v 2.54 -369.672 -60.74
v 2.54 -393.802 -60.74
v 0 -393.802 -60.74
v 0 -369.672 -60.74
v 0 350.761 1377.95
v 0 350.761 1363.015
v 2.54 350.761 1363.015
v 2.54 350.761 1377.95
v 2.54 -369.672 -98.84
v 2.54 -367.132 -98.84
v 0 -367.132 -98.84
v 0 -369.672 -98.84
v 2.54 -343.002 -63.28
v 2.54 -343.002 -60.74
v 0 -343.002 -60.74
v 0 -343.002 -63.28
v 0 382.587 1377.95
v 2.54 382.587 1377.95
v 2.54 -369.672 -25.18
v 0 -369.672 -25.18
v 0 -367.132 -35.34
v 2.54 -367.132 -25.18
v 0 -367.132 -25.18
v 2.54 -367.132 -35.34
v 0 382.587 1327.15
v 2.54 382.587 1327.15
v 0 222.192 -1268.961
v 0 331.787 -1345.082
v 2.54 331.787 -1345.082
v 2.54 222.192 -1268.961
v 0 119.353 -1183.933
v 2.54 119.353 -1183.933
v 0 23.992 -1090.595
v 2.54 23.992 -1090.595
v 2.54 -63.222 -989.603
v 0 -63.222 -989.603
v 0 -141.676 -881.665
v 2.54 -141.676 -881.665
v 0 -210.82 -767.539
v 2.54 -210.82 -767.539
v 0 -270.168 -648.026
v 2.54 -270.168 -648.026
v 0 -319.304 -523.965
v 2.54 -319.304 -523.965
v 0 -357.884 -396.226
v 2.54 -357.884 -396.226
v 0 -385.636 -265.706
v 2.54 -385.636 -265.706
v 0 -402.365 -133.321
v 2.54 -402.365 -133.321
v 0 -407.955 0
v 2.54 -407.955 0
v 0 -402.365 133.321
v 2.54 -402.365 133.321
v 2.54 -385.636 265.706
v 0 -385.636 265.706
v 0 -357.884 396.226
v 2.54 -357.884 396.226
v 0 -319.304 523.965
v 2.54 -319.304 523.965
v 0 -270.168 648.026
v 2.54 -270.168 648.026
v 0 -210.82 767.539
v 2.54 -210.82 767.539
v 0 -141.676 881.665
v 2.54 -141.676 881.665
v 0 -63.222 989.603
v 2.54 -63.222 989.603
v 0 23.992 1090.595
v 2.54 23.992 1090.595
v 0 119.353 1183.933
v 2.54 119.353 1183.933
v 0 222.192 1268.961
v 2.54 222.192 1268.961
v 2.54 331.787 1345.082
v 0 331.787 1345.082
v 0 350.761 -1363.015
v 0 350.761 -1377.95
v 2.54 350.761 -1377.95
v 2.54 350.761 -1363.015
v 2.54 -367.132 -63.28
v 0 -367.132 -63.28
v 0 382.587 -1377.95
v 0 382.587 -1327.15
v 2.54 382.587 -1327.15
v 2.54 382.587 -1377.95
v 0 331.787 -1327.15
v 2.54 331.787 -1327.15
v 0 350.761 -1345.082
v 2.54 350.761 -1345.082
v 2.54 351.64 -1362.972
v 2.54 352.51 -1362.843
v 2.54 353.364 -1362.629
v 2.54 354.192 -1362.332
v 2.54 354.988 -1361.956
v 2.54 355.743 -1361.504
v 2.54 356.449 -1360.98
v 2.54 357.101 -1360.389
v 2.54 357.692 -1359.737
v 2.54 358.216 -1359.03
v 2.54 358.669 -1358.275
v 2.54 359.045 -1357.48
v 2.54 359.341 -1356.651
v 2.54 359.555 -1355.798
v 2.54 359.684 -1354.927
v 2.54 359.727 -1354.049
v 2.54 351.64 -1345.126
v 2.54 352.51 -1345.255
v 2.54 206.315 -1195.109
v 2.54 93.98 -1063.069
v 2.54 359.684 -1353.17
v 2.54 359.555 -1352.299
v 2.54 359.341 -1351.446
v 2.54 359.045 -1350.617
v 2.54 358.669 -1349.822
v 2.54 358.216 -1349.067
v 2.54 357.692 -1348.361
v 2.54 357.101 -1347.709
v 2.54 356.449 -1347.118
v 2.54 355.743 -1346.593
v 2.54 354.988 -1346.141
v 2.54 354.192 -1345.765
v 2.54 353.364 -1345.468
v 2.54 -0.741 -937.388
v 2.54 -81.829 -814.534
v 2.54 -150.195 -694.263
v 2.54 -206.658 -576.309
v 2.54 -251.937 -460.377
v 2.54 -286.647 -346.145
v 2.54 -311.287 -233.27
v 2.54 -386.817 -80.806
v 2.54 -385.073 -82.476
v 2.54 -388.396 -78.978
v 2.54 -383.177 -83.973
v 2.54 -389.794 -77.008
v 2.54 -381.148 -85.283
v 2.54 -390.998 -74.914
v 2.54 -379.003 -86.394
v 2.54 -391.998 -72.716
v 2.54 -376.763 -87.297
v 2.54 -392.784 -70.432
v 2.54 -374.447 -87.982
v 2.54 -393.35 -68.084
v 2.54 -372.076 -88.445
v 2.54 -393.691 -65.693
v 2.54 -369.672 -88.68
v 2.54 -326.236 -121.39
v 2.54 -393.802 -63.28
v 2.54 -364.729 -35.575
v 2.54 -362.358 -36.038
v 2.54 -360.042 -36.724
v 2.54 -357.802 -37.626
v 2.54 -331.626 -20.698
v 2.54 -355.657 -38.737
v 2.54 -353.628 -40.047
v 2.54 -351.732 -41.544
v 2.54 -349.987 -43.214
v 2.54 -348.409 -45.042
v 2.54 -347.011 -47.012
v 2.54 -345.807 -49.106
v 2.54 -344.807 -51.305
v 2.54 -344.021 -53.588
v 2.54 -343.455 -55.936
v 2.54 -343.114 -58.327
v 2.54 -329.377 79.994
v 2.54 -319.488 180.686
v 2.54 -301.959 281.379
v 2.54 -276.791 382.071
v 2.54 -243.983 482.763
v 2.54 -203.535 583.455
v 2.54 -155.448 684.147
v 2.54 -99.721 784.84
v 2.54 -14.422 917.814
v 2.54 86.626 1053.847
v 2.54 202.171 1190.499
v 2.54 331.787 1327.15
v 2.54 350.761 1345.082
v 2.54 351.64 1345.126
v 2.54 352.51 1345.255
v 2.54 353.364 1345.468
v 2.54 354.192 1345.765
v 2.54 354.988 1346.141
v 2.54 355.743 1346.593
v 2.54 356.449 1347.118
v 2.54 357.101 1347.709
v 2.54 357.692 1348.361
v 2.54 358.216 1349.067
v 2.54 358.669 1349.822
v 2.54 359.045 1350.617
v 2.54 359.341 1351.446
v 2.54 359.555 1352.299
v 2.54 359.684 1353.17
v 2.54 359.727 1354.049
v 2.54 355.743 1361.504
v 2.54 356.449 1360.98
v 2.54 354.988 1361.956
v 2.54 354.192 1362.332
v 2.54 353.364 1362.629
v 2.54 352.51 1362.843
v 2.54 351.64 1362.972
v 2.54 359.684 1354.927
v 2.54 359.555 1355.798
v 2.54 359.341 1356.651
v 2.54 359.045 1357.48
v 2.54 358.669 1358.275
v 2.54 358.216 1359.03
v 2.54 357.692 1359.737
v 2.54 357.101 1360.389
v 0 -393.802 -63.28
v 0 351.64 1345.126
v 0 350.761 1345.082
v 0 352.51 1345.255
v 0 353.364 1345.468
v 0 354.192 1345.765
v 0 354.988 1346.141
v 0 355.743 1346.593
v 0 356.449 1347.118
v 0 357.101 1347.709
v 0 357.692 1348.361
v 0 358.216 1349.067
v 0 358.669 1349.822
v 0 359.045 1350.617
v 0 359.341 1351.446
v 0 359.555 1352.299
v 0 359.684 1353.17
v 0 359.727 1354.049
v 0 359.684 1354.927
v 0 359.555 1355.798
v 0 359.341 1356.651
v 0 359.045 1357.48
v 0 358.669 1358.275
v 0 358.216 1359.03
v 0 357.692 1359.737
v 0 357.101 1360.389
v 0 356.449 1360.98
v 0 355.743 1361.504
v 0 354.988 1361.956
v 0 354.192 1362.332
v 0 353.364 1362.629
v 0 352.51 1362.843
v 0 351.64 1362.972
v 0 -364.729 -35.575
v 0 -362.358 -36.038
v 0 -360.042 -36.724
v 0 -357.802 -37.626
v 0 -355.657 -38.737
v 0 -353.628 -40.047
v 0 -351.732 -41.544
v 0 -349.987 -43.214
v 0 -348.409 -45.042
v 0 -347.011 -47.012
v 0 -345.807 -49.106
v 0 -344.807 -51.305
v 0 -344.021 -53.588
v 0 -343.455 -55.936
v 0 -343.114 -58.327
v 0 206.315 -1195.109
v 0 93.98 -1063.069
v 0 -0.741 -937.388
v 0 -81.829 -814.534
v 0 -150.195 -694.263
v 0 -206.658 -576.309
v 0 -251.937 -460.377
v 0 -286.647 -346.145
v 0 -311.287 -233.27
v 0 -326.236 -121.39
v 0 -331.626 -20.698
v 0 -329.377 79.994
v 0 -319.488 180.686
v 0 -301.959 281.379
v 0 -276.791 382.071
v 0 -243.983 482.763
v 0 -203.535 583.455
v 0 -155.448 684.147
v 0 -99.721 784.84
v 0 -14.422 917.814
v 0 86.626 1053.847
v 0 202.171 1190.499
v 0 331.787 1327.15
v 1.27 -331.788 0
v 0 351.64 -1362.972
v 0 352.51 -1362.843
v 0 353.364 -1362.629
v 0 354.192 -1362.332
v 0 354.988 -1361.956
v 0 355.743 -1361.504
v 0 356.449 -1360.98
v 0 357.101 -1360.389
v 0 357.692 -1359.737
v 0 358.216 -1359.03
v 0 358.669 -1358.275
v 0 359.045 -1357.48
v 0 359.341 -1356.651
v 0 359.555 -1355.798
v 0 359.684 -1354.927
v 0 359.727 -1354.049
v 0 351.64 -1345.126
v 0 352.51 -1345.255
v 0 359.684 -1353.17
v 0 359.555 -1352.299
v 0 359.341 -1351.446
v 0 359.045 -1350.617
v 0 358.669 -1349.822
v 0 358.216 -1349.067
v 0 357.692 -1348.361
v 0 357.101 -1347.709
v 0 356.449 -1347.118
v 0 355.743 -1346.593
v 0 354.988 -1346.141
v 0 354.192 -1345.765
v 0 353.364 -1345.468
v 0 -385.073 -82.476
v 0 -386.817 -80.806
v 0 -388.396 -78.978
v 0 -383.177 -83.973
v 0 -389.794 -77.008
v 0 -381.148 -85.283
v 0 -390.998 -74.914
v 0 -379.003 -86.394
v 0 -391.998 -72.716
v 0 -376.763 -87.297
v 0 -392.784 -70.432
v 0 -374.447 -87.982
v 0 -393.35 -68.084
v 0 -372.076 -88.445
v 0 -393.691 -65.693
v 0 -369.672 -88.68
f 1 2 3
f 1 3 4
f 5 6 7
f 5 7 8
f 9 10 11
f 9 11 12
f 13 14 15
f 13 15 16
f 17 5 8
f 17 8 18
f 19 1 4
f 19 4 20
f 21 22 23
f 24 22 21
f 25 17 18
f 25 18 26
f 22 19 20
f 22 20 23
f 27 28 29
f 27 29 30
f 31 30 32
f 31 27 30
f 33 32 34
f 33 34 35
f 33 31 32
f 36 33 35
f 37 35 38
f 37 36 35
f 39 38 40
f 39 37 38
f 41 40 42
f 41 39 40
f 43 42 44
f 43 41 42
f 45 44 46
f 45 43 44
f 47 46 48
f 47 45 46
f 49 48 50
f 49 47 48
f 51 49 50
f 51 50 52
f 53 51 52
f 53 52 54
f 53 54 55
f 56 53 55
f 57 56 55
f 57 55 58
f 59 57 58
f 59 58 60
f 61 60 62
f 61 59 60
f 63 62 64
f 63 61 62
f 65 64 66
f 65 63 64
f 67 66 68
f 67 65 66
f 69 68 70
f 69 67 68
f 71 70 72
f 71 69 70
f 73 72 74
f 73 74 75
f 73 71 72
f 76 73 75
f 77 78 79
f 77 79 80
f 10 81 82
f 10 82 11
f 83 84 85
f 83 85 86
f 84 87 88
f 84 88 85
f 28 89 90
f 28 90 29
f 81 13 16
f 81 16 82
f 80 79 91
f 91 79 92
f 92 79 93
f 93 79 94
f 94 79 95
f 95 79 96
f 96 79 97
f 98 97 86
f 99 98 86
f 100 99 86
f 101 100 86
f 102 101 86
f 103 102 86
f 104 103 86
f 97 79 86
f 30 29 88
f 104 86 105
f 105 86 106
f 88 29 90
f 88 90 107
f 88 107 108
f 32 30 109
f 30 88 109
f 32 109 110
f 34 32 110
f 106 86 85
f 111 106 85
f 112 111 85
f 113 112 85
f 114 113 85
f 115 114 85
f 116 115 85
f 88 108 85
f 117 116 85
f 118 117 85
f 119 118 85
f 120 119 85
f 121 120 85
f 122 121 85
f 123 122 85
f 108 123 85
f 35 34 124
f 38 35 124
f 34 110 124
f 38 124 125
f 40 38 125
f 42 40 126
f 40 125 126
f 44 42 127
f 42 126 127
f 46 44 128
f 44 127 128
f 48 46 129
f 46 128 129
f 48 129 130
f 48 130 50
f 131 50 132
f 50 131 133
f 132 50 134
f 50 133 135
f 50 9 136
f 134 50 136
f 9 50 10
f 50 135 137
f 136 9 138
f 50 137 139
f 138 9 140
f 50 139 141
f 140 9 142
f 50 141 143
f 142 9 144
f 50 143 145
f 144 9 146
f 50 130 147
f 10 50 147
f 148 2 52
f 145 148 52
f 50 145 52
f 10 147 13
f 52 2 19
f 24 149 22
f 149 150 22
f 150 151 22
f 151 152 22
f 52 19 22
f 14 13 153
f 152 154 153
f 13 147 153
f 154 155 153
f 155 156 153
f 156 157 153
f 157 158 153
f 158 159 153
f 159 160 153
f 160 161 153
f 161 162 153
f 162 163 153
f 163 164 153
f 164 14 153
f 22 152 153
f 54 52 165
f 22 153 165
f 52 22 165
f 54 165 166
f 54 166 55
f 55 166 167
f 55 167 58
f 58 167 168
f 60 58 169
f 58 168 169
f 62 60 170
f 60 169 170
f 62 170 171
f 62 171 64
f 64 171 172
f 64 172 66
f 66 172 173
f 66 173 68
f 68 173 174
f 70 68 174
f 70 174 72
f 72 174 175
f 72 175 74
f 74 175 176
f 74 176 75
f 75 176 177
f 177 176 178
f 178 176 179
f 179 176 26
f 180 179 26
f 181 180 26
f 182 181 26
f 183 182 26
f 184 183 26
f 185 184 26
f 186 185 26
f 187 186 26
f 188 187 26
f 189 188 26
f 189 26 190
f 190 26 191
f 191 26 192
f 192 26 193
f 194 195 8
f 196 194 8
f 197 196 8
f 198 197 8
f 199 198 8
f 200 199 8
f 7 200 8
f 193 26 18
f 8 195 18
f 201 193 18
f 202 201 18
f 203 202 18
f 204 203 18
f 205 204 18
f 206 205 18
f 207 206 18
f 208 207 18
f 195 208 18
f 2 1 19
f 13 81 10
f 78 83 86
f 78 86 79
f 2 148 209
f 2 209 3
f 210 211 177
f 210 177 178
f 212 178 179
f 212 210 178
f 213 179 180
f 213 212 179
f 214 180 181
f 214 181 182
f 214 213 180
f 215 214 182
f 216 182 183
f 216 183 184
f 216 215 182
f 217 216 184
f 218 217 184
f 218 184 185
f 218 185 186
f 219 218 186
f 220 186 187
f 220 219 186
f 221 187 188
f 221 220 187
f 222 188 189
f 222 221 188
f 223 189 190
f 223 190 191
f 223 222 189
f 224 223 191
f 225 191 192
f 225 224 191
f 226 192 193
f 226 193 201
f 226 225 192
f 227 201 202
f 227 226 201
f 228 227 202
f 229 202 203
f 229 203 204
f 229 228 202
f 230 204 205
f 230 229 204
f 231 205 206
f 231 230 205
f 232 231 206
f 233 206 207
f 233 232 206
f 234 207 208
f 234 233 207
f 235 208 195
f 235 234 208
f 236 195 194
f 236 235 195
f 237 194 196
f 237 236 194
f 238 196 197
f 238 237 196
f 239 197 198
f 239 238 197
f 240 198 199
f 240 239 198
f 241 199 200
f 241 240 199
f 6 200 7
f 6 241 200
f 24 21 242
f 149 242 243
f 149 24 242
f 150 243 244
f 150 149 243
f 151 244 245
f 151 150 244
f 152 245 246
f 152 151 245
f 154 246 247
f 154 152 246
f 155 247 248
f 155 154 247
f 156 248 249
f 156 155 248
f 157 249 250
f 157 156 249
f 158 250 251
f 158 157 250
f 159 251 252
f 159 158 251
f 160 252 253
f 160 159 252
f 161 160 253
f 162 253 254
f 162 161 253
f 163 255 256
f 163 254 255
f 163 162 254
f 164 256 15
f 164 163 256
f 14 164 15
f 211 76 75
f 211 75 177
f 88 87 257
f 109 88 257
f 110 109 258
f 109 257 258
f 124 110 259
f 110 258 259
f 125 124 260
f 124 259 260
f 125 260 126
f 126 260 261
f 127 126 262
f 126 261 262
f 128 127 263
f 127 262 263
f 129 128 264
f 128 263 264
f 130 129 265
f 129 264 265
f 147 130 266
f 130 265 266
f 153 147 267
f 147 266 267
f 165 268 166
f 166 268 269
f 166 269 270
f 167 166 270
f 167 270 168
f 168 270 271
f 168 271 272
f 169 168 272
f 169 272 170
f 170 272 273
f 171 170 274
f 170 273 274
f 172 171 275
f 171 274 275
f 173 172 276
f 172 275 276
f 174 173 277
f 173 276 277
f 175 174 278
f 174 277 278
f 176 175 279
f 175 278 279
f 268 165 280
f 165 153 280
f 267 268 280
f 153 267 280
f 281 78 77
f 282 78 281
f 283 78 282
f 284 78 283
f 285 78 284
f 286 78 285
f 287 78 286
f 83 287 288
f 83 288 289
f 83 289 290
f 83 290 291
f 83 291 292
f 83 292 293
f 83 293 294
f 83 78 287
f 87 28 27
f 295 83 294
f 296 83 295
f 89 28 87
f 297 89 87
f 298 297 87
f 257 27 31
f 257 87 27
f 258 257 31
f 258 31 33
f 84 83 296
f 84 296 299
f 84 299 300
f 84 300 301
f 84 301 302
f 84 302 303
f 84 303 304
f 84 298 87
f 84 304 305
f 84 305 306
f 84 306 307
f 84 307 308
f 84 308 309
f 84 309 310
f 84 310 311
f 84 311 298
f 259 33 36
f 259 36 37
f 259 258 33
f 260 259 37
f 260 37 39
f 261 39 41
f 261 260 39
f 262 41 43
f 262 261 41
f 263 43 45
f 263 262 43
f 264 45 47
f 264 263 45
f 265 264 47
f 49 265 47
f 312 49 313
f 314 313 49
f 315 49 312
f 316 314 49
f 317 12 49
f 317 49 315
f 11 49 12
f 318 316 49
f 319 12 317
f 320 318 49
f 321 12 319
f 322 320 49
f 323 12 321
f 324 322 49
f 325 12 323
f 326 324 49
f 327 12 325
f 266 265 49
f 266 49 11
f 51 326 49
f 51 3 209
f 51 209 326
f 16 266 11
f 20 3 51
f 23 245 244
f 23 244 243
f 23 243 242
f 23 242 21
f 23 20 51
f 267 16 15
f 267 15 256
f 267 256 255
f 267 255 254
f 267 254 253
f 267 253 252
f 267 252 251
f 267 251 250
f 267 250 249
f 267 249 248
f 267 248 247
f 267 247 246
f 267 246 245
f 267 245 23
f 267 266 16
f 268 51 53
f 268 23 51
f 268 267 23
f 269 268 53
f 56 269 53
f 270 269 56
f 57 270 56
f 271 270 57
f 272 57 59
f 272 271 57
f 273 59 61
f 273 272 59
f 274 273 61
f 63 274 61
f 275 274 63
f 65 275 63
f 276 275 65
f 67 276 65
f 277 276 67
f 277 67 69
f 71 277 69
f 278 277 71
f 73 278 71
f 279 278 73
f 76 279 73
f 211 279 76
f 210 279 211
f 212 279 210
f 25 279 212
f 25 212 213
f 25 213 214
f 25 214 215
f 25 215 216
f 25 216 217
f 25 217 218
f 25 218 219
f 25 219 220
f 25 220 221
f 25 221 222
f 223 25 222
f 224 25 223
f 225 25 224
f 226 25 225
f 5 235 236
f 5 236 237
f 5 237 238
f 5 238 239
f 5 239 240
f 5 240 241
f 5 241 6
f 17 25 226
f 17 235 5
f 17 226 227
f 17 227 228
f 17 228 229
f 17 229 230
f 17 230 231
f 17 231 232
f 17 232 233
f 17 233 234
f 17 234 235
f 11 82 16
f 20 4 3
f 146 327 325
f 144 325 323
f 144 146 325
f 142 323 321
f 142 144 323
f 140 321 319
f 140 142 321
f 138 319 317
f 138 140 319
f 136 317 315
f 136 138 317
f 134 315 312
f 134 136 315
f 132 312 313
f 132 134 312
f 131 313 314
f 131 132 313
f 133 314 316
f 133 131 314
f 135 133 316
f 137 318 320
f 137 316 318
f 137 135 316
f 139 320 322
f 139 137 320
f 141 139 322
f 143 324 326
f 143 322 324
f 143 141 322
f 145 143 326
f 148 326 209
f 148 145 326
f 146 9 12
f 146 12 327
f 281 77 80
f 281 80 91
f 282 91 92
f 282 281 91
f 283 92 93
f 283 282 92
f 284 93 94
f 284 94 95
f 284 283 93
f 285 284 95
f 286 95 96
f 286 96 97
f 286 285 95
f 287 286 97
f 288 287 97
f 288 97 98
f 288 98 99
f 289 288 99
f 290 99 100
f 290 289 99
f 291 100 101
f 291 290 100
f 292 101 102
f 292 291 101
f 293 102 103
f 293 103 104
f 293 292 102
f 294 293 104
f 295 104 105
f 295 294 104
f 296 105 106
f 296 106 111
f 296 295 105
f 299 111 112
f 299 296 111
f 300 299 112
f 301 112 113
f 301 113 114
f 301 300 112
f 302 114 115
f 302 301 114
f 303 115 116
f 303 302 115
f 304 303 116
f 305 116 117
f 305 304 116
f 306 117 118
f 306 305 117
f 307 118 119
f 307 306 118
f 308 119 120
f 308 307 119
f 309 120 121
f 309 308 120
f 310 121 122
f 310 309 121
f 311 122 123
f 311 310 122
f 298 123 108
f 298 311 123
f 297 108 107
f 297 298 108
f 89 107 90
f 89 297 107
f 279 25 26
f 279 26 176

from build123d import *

# Parameters (mm, degrees)
BOSS_EXTRUDE1_DEPTH = 2.54
CUT_EXTRUDE1_DEPTH  = 1438.073344451


with BuildPart() as part:
    # Sketch60 → Boss-Extrude1 (new body)
    with BuildSketch(Plane(origin=(0, 0, 0), x_dir=(0, 0, -1), z_dir=(1, 0, 0))):
        with BuildLine():
            Line((1327.15, 331.787470833), (1327.15, 382.587350833))
            Line((1327.15, 382.587350833), (1377.950002406, 382.587350833))
            Line((1377.950002406, 382.587350833), (1377.950002406, 350.761150833))
            Line((1377.950002406, 350.761150833), (1363.014798129, 350.761150833))
            ThreePointArc((1363.014798129, 350.761150833), (1354.048599065, 359.727349897), (1345.0824, 350.761150833))
            Line((1345.0824, 350.761150833), (1345.0824, 331.787470833))
            ThreePointArc((1345.0824, 331.787470833), (0, -407.954821328), (-1345.0824, 331.787470832))
            Line((-1345.0824, 331.787470832), (-1345.0824, 350.761150833))
            ThreePointArc((-1345.0824, 350.761150833), (-1354.048599065, 359.727349897), (-1363.014798129, 350.761150833))
            Line((-1363.014798129, 350.761150833), (-1377.950002406, 350.761150833))
            Line((-1377.950002406, 350.761150833), (-1377.950002406, 382.587350833))
            Line((-1377.950002406, 382.587350833), (-1327.15, 382.587350833))
            Line((-1327.15, 382.587350833), (-1327.15, 331.787470833))
            add(Edge.make_bspline(
                [(1327.15, 331.787470833), (1e-09, -995.362529167), (-1327.15, 331.787470833)],
                knots=[0, 0, 0, 1, 1, 1], degree=2))
        make_face()
    extrude(amount=BOSS_EXTRUDE1_DEPTH)

    # Sketch61 → Cut-Extrude1 (cut, through all)
    with BuildSketch(Plane(origin=(2.54, 0, 0), x_dir=(0, 0, -1), z_dir=(1, 0, 0))):
        with BuildLine():
            Line((63.280114483, -343.002479543), (63.280114483, -367.132479543))
            Line((63.280114483, -367.132479543), (98.840114483, -367.132479543))
            Line((98.840114483, -367.132479543), (98.840114483, -369.672479543))
            Line((98.840114483, -369.672479543), (88.680114483, -369.672479543))
            ThreePointArc((88.680114483, -369.672479543), (80.80611969, -386.817485024), (63.280114483, -393.802479543))
            Line((63.280114483, -393.802479543), (60.740114483, -393.802479543))
            Line((60.740114483, -393.802479543), (60.740114483, -369.672479543))
            Line((60.740114483, -369.672479543), (25.180114483, -369.672479543))
            Line((25.180114483, -369.672479543), (25.180114483, -367.132479543))
            Line((25.180114483, -367.132479543), (35.340114483, -367.132479543))
            ThreePointArc((35.340114483, -367.132479543), (43.214109276, -349.987474062), (60.740114483, -343.002479543))
            Line((60.740114483, -343.002479543), (63.280114483, -343.002479543))
        make_face()
    extrude(amount=-CUT_EXTRUDE1_DEPTH, mode=Mode.SUBTRACT)


solid = part.part
